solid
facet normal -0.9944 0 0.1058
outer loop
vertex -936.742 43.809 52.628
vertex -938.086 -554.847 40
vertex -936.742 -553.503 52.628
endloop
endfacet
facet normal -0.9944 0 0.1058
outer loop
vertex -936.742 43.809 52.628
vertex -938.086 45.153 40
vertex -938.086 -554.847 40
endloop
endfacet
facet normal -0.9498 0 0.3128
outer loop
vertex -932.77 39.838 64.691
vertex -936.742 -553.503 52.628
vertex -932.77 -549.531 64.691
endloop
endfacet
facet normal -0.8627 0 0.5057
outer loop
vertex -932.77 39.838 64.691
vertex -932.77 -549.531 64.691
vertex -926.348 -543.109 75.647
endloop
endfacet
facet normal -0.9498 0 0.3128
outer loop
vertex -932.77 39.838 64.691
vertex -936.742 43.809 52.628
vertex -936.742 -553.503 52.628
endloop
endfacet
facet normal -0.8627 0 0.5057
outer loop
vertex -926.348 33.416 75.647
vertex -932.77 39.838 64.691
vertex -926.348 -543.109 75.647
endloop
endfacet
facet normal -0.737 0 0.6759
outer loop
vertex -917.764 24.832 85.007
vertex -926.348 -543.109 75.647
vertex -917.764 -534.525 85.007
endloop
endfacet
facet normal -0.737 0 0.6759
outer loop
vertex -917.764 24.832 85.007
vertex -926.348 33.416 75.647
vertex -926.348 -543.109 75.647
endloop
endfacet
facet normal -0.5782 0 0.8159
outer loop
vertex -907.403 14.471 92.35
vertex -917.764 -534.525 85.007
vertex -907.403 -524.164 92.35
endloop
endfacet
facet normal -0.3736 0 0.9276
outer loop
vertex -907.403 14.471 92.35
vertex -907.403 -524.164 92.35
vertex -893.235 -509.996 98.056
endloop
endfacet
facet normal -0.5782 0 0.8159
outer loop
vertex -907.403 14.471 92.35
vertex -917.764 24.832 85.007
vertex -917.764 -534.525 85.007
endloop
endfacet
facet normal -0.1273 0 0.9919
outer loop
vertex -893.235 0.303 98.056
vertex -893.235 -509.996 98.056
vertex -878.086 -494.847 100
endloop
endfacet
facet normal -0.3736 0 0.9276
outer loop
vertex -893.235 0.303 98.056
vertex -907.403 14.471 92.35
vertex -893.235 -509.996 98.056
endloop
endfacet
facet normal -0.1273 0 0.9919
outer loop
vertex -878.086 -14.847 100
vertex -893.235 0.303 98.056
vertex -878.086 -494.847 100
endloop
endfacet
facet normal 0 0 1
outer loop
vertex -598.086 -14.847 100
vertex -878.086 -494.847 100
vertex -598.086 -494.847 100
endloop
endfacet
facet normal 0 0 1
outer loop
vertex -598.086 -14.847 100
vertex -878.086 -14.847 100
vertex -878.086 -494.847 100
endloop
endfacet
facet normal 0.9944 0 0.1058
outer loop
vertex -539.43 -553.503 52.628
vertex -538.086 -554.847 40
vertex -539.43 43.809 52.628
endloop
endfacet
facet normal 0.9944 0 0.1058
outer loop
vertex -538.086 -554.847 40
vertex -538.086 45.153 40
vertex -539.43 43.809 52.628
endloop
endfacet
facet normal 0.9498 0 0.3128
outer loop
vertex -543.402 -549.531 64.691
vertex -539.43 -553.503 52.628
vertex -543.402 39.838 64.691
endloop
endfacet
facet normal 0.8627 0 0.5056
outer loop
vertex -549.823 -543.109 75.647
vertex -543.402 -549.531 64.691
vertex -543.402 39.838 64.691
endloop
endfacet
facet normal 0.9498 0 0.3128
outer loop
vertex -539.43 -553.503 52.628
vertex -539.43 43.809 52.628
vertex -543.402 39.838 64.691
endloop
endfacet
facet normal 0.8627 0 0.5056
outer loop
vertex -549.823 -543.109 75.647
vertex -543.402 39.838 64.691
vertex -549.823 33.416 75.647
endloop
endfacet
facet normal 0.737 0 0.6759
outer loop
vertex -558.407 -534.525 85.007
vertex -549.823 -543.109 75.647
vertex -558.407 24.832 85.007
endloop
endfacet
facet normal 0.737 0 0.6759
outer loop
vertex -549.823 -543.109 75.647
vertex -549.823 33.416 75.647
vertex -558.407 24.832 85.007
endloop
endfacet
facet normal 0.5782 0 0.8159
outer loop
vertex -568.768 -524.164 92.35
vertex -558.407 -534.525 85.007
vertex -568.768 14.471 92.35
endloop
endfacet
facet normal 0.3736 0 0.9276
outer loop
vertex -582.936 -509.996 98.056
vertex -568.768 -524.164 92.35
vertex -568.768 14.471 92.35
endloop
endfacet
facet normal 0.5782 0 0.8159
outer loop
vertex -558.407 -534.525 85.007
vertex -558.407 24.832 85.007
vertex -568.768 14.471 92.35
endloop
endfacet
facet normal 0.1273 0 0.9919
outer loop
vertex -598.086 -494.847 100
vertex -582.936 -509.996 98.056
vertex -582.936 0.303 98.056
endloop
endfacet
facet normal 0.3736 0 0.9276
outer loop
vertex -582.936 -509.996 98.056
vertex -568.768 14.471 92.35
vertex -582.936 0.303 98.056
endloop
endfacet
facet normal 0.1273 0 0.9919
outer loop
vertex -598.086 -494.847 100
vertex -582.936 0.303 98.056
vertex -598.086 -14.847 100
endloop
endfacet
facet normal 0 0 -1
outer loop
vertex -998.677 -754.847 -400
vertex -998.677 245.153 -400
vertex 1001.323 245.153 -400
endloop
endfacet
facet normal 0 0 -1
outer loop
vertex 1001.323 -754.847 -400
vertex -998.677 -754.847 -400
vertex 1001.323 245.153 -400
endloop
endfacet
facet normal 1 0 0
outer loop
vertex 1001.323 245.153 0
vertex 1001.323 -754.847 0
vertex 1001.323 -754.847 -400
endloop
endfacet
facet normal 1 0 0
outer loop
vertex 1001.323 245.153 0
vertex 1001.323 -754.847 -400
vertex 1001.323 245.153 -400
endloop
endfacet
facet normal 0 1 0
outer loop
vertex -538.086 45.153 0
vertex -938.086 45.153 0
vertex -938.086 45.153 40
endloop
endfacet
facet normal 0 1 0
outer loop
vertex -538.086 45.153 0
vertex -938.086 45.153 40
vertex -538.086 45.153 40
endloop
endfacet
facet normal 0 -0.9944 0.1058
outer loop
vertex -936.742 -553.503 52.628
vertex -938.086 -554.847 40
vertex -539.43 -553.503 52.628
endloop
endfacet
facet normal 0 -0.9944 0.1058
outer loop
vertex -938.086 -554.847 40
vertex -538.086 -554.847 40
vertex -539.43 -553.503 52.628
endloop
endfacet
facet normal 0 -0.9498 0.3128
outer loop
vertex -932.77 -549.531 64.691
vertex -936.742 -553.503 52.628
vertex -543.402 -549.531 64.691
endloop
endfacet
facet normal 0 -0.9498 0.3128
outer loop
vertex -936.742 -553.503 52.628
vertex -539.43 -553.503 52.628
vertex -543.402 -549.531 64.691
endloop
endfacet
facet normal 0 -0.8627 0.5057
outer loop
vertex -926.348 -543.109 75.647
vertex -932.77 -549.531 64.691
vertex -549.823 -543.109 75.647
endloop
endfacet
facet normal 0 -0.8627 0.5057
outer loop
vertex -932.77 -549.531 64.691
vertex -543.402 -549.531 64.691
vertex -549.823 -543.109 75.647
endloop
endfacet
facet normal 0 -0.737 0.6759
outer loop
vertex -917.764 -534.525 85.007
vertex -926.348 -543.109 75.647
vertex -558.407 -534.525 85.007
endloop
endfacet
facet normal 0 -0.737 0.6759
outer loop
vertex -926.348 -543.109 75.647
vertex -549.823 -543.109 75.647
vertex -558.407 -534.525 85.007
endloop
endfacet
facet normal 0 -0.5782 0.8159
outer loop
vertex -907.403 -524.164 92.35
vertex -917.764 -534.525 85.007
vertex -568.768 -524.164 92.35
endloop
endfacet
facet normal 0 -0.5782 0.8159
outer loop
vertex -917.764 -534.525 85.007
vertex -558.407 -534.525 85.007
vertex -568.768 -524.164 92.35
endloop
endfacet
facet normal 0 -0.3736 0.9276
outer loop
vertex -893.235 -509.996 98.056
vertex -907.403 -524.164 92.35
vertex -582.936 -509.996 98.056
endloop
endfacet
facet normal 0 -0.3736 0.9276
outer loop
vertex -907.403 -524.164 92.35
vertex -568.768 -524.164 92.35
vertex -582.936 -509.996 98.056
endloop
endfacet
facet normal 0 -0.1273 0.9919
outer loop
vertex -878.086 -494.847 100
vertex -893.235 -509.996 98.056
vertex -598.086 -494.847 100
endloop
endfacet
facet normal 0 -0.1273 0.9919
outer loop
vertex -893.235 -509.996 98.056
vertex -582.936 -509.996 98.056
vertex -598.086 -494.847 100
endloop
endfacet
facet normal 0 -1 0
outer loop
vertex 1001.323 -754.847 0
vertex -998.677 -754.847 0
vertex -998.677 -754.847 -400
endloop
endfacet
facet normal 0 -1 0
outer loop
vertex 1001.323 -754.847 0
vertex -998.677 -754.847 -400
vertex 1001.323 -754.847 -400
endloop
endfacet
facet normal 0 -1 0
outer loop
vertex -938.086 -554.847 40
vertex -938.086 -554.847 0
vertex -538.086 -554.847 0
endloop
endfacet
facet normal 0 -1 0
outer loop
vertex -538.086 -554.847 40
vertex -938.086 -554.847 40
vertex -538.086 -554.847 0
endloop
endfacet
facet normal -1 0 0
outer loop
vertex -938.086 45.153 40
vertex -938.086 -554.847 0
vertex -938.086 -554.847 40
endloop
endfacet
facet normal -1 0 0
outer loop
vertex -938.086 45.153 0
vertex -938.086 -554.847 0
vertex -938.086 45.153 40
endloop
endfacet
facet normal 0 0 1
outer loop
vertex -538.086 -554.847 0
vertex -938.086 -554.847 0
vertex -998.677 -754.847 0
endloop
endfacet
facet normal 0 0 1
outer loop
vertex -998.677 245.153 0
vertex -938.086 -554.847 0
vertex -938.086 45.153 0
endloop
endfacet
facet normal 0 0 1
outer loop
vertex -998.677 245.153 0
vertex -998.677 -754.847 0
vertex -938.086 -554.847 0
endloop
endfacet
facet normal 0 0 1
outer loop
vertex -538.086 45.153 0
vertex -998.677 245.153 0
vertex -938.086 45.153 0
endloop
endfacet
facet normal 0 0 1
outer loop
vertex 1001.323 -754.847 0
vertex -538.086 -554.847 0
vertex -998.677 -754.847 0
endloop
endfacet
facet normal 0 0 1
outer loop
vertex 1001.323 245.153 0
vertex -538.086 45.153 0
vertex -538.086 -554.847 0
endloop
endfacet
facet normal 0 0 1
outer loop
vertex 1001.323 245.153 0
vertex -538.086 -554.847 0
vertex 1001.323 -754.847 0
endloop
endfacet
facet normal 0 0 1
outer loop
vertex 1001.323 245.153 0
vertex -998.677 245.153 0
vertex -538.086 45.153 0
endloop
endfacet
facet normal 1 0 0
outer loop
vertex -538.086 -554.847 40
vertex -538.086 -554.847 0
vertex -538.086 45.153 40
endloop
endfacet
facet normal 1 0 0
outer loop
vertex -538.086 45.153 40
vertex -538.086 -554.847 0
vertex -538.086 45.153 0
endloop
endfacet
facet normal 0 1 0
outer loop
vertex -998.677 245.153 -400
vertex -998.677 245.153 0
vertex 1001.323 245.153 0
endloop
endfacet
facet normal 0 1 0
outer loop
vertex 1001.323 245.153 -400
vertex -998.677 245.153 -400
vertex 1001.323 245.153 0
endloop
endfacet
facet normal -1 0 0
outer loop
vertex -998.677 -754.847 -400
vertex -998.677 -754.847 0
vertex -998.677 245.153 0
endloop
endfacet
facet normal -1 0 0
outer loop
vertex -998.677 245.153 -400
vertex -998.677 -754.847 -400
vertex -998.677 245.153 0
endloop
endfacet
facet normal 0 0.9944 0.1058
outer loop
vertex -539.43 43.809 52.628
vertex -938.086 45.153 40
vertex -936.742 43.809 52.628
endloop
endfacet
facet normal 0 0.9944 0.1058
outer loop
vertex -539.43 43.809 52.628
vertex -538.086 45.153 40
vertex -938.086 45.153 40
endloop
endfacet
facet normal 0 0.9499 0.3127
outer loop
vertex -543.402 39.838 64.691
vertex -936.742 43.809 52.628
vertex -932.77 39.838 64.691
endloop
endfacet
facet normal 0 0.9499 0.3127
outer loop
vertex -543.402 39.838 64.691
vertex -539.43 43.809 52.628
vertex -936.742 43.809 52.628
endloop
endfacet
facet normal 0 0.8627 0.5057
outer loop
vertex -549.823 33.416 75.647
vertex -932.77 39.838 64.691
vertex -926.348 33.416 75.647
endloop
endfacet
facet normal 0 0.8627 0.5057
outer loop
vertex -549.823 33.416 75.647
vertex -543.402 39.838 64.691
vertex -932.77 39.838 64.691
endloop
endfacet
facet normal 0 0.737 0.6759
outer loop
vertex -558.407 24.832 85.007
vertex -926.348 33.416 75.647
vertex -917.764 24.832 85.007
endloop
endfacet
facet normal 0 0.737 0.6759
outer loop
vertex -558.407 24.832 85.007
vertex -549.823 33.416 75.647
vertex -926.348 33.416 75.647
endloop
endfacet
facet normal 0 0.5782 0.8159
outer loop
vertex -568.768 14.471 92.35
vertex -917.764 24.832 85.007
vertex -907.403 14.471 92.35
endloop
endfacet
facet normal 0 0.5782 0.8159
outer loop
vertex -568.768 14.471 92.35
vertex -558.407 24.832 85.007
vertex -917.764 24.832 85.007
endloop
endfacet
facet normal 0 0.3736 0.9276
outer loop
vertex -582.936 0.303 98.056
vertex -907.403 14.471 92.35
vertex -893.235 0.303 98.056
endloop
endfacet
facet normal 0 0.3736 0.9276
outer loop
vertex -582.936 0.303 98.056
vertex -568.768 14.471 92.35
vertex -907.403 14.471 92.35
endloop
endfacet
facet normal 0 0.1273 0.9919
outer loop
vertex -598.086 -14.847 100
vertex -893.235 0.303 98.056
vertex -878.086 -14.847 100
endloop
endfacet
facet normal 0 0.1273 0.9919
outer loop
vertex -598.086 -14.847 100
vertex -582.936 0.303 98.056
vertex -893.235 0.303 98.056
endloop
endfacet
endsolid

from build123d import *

# Parameters (mm, degrees)
F0_W     = 2000
F0_H     = 1000
F2_DEPTH = 400
F1_W     = 400
F1_H     = 600
F3_DEPTH = 100
F4_R     = 60


with BuildPart() as f2:
    # F0 (on Top) → F2 (new body)
    with BuildSketch(Plane.XY):
        with Locations((1.323093, -254.846548)):
            Rectangle(F0_W, F0_H)
    extrude(amount=-F2_DEPTH)

    # F1 (on face) → F3 (join)
    with BuildSketch(Plane.XY):
        with Locations((-738.085746, -254.846548)):
            Rectangle(F1_W, F1_H)
    extrude(amount=F3_DEPTH)

    # F4
    f4_edges = [f2.edges().sort_by_distance(p)[0] for p in [
        (-738.085746, -554.846548, 100),
        (-738.085746, 45.153452, 100),
        (-538.085746, -254.846548, 100),
        (-938.085746, -254.846548, 100),
    ]]
    fillet(f4_edges, radius=F4_R)


solid = f2.part
